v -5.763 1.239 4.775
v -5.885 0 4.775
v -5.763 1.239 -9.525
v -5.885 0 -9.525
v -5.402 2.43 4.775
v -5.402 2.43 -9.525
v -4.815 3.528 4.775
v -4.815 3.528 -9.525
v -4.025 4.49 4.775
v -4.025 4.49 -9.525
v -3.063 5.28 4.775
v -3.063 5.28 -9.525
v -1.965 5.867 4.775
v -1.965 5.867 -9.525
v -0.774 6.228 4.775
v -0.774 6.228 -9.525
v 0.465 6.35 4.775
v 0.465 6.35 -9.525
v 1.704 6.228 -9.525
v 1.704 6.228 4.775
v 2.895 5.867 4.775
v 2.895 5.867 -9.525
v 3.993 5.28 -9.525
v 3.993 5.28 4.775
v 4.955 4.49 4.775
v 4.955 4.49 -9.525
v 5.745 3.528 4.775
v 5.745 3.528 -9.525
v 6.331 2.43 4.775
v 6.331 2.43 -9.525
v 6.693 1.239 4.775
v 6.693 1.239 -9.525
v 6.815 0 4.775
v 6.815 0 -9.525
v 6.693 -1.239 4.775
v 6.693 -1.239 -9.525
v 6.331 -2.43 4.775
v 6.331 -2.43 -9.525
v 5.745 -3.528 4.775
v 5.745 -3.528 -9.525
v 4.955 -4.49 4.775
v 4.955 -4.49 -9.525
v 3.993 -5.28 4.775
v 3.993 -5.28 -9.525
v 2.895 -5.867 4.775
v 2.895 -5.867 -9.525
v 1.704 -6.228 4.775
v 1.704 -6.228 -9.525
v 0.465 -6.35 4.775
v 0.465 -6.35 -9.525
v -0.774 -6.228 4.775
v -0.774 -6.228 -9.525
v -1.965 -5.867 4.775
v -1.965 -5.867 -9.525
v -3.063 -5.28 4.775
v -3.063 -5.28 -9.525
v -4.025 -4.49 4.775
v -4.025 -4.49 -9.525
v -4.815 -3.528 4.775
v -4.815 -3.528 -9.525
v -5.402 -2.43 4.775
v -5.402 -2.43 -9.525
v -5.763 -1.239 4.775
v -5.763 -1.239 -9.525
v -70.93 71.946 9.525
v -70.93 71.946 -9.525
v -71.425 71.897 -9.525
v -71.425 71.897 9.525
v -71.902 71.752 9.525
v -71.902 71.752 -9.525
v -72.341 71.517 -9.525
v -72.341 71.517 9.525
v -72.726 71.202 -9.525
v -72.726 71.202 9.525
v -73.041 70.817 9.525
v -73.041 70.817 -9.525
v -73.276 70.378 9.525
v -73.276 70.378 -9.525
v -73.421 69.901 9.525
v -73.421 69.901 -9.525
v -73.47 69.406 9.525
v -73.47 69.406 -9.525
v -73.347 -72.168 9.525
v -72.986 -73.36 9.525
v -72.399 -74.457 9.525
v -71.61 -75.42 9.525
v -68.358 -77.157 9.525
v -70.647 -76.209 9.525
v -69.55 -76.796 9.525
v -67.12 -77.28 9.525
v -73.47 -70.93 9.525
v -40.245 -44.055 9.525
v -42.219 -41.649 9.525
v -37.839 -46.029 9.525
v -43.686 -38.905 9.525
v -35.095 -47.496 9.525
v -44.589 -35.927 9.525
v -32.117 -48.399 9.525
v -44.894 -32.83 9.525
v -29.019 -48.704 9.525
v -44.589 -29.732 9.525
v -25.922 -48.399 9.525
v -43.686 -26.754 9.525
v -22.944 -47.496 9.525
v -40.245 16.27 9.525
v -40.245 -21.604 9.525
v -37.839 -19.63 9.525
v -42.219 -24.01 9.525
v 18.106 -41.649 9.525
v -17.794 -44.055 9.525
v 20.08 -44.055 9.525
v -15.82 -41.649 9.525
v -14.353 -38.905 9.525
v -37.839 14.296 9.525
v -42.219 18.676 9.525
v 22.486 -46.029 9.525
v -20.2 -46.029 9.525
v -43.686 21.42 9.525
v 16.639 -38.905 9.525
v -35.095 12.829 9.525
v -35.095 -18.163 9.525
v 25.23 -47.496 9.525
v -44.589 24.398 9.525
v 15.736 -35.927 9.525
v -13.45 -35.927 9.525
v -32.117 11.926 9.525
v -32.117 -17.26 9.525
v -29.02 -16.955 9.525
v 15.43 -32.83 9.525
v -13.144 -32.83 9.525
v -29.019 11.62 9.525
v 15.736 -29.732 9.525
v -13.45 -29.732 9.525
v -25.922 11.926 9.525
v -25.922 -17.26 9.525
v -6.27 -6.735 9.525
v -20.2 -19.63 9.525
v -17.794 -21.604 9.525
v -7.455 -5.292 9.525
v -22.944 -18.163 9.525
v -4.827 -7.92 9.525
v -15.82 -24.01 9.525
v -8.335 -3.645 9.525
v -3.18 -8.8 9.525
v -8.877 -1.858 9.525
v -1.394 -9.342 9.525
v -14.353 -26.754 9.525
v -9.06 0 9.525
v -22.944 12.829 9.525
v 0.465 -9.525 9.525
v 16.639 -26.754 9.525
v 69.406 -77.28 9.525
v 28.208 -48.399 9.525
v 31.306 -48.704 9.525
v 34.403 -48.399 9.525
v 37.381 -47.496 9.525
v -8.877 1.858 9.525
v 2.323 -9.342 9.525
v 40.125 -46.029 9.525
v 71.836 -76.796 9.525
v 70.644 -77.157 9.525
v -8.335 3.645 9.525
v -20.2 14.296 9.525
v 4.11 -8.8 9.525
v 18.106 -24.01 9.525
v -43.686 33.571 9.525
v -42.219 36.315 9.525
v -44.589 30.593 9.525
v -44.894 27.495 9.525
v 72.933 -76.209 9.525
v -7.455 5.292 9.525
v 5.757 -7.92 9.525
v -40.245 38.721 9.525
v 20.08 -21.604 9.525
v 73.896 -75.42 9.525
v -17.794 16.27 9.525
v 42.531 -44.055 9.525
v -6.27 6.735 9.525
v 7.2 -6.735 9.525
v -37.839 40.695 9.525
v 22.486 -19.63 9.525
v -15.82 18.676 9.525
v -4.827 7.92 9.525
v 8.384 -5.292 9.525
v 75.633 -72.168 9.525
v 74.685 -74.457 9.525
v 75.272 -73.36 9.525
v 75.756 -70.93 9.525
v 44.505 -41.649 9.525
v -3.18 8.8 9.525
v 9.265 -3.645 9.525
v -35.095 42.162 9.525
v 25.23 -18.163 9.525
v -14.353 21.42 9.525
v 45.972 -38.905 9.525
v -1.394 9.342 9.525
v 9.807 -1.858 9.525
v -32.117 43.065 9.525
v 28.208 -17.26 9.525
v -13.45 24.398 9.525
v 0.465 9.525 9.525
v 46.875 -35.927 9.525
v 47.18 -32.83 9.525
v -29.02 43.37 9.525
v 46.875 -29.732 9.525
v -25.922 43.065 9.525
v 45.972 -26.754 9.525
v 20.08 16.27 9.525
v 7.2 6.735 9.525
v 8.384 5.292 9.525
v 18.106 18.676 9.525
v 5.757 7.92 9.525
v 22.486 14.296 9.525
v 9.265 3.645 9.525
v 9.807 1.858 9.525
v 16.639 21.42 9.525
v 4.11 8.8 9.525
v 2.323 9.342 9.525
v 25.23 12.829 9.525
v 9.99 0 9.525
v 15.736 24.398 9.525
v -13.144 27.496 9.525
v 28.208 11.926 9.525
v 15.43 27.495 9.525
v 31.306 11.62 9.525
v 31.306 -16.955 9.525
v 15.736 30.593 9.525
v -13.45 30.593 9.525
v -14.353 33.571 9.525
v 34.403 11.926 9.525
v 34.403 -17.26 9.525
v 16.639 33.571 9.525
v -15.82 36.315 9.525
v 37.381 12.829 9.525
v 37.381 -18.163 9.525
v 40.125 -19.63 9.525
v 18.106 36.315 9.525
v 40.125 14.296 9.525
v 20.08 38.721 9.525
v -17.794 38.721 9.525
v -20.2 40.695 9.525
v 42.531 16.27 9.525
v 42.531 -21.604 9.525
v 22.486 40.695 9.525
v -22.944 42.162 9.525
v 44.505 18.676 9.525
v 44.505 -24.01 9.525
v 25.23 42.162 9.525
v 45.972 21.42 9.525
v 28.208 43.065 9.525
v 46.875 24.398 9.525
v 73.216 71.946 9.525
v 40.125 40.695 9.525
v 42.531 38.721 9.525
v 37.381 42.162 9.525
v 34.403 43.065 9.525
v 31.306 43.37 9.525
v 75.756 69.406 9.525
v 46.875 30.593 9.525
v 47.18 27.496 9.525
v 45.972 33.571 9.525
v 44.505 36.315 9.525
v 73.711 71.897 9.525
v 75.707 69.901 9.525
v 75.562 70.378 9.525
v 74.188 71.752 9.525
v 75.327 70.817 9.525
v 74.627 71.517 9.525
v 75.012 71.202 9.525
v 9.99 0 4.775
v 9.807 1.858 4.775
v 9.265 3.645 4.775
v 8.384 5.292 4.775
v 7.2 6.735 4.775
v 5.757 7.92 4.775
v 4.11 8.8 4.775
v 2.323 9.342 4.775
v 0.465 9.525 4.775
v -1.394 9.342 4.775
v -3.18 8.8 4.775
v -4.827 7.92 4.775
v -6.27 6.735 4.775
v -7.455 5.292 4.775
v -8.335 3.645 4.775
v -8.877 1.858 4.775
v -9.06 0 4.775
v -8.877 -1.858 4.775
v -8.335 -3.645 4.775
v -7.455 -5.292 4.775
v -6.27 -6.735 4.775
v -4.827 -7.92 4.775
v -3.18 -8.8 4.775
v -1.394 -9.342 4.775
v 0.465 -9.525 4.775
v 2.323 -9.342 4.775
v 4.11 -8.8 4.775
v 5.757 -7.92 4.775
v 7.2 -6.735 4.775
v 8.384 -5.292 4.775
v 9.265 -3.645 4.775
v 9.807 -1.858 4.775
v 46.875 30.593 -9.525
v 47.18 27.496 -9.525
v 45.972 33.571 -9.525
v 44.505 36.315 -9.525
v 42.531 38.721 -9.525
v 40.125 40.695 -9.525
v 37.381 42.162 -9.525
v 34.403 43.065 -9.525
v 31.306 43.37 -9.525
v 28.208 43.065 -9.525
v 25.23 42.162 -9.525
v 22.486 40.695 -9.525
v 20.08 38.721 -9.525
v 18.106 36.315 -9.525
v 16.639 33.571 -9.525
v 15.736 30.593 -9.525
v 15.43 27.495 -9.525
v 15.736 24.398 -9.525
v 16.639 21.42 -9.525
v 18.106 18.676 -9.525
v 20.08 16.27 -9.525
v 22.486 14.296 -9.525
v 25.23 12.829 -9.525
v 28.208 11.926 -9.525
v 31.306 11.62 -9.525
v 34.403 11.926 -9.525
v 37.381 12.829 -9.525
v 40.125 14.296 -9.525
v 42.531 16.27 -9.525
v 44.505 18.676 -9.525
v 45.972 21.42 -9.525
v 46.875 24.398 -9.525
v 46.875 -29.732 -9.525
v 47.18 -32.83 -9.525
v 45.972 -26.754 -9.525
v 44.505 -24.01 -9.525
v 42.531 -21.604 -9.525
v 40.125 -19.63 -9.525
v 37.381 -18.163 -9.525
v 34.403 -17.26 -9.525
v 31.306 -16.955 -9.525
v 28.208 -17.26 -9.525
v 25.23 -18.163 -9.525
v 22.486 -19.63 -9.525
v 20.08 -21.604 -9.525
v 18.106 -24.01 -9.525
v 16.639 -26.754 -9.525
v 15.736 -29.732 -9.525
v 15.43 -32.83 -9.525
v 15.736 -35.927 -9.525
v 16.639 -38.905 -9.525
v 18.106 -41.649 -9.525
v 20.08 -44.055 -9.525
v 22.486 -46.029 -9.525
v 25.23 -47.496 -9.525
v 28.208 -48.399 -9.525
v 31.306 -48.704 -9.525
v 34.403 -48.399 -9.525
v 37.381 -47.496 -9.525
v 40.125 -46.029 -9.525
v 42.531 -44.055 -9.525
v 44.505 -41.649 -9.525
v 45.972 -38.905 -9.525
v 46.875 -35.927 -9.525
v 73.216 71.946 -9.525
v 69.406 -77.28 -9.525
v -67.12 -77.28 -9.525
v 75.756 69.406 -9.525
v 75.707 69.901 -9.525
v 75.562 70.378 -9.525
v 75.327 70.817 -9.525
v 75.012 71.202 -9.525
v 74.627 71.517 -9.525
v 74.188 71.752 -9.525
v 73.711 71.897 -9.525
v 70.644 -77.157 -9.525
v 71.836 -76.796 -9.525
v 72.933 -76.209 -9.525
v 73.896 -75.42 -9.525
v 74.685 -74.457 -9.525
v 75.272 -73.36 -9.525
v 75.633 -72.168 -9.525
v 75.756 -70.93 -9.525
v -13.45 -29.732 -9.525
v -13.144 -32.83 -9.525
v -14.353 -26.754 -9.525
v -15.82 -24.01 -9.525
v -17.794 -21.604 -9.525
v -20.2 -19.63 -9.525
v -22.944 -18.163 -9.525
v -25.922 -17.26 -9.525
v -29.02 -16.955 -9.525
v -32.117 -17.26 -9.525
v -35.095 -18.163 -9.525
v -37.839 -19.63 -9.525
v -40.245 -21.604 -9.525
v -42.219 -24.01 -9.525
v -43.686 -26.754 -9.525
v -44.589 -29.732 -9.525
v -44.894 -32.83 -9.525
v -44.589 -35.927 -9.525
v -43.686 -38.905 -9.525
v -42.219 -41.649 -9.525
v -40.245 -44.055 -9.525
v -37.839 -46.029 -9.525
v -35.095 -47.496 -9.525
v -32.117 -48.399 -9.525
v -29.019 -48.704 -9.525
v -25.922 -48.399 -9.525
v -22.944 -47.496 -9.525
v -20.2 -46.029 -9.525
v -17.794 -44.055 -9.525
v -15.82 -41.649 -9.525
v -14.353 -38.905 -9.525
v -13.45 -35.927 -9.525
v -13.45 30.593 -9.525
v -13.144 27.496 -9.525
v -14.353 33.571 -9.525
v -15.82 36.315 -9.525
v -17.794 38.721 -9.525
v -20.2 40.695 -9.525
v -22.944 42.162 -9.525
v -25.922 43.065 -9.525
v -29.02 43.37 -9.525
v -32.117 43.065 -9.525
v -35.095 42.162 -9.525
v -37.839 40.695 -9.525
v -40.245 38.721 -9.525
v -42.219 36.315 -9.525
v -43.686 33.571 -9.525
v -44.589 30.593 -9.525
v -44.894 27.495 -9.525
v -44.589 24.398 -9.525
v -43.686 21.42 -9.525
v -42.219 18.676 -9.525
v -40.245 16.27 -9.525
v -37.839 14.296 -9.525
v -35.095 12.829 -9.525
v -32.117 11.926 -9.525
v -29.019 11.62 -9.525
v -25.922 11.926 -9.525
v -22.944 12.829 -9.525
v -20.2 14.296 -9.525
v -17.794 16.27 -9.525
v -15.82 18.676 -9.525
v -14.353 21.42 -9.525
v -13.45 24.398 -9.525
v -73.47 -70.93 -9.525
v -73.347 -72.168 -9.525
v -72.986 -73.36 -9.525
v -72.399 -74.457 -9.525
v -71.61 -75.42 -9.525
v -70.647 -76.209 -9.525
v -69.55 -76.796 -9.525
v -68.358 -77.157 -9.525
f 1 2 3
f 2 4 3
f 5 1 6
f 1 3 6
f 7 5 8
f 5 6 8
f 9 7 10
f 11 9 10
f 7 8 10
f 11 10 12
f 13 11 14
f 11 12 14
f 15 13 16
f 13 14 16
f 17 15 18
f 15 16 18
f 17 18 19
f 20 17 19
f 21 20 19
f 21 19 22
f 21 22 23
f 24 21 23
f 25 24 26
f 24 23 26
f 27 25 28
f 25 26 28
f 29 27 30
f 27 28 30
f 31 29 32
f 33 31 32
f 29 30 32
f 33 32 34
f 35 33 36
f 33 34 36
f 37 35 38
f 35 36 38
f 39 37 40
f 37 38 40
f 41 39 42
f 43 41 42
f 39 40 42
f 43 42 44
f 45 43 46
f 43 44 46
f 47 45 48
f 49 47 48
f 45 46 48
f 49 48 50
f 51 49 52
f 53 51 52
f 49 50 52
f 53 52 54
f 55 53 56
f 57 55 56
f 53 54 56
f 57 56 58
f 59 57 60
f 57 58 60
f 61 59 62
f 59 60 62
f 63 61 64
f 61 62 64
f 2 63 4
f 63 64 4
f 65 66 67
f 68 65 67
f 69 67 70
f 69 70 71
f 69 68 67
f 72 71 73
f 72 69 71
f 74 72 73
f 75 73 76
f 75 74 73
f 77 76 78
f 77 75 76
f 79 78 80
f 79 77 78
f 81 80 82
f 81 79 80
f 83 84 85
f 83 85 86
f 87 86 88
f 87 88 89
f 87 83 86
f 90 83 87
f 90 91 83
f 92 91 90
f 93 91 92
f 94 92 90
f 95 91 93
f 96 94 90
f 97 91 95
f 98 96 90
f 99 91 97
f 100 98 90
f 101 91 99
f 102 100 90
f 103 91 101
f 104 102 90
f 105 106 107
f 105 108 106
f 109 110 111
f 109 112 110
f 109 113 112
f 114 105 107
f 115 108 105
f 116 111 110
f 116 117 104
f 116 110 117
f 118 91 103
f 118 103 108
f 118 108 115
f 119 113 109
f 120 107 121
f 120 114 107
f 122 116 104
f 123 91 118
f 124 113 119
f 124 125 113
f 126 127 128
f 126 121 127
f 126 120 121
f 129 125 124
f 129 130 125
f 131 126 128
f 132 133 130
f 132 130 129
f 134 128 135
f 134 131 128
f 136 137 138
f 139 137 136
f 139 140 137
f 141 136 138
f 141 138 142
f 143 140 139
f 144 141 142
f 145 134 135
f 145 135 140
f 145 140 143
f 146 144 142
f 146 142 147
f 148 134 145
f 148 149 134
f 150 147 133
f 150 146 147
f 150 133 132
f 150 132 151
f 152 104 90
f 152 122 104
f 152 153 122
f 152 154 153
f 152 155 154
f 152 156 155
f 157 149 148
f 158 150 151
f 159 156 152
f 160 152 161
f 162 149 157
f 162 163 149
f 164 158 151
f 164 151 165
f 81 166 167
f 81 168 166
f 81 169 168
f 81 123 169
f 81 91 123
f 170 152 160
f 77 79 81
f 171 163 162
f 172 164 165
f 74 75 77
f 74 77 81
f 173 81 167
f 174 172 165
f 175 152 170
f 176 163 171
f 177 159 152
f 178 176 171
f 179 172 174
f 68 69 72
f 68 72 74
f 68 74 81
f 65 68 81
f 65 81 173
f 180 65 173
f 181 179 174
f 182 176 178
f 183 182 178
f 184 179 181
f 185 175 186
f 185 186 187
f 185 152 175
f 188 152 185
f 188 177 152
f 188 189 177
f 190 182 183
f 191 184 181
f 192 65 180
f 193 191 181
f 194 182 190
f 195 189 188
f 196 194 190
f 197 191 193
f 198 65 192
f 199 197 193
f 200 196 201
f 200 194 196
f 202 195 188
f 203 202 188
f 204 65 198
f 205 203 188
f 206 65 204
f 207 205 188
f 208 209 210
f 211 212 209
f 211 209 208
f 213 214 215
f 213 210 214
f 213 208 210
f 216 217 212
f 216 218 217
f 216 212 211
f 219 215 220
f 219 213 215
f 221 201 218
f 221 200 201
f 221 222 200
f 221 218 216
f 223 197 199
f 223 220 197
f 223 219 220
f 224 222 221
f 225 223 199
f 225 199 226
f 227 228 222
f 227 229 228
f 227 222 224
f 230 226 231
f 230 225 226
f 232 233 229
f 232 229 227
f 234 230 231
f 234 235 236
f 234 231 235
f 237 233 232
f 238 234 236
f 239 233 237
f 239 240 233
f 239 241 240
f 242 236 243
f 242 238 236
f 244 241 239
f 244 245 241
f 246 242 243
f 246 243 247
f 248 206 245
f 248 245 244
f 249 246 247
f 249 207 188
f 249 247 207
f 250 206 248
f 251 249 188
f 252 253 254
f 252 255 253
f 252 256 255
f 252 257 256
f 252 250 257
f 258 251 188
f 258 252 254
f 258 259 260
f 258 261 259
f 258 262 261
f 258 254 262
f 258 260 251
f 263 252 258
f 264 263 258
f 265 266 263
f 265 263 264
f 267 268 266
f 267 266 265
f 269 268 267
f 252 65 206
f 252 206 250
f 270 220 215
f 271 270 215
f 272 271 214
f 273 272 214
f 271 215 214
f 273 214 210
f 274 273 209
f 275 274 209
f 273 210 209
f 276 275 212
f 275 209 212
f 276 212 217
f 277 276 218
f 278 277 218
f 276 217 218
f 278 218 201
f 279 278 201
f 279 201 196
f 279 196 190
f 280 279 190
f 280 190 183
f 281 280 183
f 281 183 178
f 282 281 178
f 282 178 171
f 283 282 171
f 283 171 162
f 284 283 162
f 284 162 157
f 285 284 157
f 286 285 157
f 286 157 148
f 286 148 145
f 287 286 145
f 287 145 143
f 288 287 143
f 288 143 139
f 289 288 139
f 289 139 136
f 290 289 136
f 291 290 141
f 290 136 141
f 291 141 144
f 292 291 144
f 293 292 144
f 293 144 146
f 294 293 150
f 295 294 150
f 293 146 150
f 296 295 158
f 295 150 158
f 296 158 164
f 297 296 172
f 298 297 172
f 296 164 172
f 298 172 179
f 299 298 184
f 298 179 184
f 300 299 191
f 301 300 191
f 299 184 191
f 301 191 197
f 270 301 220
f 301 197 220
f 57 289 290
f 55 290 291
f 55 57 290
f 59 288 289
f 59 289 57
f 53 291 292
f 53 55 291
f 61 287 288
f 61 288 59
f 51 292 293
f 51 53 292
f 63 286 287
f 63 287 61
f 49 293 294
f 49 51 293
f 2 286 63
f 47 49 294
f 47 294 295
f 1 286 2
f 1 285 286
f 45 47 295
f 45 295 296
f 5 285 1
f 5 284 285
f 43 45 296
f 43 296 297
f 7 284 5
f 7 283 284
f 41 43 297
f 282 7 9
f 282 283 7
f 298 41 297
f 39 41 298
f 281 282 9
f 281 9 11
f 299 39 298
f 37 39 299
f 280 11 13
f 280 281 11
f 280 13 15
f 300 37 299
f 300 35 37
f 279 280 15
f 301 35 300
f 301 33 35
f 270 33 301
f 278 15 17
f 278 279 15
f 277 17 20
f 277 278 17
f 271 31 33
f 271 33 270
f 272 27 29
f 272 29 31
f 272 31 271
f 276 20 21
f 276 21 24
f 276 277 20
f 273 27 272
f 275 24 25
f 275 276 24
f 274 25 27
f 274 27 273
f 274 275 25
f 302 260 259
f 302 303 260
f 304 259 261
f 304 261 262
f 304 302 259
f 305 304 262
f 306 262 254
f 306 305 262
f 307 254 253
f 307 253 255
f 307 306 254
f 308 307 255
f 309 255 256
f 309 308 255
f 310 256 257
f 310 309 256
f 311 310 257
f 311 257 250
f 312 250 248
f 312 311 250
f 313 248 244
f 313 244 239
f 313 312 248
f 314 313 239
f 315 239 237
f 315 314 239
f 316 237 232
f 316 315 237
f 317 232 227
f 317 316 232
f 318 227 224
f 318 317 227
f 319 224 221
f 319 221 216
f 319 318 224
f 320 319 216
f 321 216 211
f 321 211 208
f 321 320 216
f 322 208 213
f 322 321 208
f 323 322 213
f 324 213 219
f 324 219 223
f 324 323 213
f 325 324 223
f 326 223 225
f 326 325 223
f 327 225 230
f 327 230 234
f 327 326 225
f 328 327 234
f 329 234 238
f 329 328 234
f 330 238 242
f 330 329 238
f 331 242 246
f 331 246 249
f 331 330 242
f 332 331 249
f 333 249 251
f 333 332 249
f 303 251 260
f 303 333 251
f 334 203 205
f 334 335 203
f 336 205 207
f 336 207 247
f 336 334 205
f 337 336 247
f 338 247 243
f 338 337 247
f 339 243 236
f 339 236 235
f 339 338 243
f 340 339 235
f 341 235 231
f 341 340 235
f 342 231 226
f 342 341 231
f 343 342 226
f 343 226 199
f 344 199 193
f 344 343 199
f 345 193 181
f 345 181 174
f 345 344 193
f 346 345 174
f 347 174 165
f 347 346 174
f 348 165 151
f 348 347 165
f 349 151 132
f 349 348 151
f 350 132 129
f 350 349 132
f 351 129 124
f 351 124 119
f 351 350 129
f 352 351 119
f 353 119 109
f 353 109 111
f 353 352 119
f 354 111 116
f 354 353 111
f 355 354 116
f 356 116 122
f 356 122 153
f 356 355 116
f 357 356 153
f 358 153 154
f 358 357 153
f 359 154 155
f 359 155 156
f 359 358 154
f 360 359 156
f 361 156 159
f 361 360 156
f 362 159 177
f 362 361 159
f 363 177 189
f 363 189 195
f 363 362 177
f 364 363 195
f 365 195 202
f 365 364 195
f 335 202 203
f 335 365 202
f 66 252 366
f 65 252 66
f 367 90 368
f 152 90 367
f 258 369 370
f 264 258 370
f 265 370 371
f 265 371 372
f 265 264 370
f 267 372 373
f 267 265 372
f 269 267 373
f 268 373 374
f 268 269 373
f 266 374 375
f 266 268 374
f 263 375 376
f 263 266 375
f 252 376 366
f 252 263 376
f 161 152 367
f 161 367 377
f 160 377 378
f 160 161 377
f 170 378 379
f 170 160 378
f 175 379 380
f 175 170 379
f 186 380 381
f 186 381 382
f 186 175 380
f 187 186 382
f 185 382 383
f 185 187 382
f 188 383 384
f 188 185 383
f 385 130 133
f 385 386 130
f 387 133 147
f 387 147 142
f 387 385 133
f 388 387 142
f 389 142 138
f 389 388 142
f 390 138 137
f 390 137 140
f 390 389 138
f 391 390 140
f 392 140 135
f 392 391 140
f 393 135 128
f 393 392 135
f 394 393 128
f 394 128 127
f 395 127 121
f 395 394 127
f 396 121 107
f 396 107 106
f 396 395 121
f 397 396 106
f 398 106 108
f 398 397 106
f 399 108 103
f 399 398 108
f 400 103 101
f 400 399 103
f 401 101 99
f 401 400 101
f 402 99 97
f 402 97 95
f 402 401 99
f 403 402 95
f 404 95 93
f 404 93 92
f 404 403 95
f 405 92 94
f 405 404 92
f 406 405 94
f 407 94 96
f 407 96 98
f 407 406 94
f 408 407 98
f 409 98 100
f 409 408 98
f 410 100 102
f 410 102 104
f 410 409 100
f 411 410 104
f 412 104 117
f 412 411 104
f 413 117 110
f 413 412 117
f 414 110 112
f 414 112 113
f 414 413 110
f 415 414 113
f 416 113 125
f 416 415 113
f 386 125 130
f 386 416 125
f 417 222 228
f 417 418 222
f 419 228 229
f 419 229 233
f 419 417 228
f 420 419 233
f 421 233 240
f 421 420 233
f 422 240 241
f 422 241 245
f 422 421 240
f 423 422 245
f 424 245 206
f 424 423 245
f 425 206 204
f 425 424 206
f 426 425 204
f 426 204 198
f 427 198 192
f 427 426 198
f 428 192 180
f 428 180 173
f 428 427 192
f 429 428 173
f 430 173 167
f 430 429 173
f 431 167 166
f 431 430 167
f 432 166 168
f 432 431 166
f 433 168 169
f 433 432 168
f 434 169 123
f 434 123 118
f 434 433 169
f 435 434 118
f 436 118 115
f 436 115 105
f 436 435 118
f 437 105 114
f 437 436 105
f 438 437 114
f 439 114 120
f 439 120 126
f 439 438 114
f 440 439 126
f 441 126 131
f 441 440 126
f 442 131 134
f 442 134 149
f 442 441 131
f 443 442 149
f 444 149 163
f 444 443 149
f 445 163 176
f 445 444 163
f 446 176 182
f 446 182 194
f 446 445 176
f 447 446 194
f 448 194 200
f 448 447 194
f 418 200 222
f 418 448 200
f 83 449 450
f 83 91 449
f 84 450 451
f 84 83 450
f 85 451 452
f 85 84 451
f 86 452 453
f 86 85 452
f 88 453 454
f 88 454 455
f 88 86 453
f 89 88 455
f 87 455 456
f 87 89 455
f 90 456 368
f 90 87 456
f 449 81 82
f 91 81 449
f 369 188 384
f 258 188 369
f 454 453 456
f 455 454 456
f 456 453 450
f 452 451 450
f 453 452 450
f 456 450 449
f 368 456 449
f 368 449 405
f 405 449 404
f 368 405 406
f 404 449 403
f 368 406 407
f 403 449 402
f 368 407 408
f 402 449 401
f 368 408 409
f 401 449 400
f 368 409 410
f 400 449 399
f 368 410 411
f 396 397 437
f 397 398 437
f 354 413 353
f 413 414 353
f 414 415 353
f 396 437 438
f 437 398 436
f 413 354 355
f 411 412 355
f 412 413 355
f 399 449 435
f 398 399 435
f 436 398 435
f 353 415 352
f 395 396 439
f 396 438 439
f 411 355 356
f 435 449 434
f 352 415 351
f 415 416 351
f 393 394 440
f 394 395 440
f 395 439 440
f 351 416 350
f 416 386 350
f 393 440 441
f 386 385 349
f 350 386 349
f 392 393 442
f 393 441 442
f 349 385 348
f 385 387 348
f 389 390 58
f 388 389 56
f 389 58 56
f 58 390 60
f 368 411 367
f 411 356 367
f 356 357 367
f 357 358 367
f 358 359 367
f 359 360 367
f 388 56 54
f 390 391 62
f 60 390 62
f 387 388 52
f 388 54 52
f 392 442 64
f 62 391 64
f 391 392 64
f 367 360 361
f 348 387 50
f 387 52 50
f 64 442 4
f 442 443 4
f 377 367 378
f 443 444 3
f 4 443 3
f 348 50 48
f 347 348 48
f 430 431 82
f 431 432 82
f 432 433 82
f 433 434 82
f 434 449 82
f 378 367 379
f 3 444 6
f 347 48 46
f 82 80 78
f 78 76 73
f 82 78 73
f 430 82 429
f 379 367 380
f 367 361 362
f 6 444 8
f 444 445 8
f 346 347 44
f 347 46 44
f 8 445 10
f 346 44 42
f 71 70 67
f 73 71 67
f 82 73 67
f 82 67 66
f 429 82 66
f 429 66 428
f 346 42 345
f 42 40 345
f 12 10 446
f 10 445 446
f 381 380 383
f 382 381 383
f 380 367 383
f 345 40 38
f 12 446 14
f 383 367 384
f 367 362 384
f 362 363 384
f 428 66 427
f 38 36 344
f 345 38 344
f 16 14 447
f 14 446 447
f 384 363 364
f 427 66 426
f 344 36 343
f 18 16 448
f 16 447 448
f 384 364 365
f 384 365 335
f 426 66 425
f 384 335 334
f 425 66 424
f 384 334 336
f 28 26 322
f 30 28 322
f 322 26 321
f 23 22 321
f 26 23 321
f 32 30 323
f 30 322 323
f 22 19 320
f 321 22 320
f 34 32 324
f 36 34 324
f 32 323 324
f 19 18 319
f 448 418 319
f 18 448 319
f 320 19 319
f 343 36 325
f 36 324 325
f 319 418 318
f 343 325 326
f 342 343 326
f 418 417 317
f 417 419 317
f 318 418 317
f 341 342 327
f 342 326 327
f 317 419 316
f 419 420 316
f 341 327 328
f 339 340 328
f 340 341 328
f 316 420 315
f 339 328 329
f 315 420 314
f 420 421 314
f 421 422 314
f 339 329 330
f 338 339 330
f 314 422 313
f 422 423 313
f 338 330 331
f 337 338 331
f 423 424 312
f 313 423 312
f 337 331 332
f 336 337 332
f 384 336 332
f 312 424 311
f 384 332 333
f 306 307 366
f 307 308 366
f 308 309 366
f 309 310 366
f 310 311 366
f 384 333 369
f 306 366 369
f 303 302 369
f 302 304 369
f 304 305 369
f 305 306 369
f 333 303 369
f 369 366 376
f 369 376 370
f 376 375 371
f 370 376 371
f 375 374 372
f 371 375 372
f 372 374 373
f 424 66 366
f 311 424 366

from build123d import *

# Parameters (mm, degrees)
F0_R           = 15.875
F1_DEPTH       = 9.525
F3_D           = 12.7
F3_CBORE_D     = 19.05
F3_CBORE_DEPTH = 4.7498


with BuildPart() as f1:
    # F0 (on Top) → F1 (new body, symmetric)
    with BuildSketch(Plane.XY):
        with BuildLine():
            Line((-67.1195, -77.2795), (69.4055, -77.2795))
            ThreePointArc((69.4055, -77.2795), (73.895628, -75.419628), (75.7555, -70.9295))
            Line((75.7555, -70.9295), (75.7555, 69.4055))
            ThreePointArc((75.7555, 69.4055), (75.011551, 71.201551), (73.2155, 71.9455))
            Line((73.2155, 71.9455), (-70.9295, 71.9455))
            ThreePointArc((-70.9295, 71.9455), (-72.725551, 71.201551), (-73.4695, 69.4055))
            Line((-73.4695, 69.4055), (-73.4695, -70.9295))
            ThreePointArc((-73.4695, -70.9295), (-71.609628, -75.419628), (-67.1195, -77.2795))
        make_face()
        with Locations((-29.0195, -32.8295)):
            Circle(F0_R, mode=Mode.SUBTRACT)
        with Locations((31.3055, -32.8295)):
            Circle(F0_R, mode=Mode.SUBTRACT)
        with Locations((-29.0195, 27.4955)):
            Circle(F0_R, mode=Mode.SUBTRACT)
        with Locations((31.3055, 27.4955)):
            Circle(F0_R, mode=Mode.SUBTRACT)
    extrude(amount=F1_DEPTH, both=True)

    # F3 (through all)
    with Locations(Plane.XY.offset(9.525)):
        with Locations((0.464717, 0)):
            CounterBoreHole(F3_D / 2, F3_CBORE_D / 2, F3_CBORE_DEPTH)


solid = f1.part
